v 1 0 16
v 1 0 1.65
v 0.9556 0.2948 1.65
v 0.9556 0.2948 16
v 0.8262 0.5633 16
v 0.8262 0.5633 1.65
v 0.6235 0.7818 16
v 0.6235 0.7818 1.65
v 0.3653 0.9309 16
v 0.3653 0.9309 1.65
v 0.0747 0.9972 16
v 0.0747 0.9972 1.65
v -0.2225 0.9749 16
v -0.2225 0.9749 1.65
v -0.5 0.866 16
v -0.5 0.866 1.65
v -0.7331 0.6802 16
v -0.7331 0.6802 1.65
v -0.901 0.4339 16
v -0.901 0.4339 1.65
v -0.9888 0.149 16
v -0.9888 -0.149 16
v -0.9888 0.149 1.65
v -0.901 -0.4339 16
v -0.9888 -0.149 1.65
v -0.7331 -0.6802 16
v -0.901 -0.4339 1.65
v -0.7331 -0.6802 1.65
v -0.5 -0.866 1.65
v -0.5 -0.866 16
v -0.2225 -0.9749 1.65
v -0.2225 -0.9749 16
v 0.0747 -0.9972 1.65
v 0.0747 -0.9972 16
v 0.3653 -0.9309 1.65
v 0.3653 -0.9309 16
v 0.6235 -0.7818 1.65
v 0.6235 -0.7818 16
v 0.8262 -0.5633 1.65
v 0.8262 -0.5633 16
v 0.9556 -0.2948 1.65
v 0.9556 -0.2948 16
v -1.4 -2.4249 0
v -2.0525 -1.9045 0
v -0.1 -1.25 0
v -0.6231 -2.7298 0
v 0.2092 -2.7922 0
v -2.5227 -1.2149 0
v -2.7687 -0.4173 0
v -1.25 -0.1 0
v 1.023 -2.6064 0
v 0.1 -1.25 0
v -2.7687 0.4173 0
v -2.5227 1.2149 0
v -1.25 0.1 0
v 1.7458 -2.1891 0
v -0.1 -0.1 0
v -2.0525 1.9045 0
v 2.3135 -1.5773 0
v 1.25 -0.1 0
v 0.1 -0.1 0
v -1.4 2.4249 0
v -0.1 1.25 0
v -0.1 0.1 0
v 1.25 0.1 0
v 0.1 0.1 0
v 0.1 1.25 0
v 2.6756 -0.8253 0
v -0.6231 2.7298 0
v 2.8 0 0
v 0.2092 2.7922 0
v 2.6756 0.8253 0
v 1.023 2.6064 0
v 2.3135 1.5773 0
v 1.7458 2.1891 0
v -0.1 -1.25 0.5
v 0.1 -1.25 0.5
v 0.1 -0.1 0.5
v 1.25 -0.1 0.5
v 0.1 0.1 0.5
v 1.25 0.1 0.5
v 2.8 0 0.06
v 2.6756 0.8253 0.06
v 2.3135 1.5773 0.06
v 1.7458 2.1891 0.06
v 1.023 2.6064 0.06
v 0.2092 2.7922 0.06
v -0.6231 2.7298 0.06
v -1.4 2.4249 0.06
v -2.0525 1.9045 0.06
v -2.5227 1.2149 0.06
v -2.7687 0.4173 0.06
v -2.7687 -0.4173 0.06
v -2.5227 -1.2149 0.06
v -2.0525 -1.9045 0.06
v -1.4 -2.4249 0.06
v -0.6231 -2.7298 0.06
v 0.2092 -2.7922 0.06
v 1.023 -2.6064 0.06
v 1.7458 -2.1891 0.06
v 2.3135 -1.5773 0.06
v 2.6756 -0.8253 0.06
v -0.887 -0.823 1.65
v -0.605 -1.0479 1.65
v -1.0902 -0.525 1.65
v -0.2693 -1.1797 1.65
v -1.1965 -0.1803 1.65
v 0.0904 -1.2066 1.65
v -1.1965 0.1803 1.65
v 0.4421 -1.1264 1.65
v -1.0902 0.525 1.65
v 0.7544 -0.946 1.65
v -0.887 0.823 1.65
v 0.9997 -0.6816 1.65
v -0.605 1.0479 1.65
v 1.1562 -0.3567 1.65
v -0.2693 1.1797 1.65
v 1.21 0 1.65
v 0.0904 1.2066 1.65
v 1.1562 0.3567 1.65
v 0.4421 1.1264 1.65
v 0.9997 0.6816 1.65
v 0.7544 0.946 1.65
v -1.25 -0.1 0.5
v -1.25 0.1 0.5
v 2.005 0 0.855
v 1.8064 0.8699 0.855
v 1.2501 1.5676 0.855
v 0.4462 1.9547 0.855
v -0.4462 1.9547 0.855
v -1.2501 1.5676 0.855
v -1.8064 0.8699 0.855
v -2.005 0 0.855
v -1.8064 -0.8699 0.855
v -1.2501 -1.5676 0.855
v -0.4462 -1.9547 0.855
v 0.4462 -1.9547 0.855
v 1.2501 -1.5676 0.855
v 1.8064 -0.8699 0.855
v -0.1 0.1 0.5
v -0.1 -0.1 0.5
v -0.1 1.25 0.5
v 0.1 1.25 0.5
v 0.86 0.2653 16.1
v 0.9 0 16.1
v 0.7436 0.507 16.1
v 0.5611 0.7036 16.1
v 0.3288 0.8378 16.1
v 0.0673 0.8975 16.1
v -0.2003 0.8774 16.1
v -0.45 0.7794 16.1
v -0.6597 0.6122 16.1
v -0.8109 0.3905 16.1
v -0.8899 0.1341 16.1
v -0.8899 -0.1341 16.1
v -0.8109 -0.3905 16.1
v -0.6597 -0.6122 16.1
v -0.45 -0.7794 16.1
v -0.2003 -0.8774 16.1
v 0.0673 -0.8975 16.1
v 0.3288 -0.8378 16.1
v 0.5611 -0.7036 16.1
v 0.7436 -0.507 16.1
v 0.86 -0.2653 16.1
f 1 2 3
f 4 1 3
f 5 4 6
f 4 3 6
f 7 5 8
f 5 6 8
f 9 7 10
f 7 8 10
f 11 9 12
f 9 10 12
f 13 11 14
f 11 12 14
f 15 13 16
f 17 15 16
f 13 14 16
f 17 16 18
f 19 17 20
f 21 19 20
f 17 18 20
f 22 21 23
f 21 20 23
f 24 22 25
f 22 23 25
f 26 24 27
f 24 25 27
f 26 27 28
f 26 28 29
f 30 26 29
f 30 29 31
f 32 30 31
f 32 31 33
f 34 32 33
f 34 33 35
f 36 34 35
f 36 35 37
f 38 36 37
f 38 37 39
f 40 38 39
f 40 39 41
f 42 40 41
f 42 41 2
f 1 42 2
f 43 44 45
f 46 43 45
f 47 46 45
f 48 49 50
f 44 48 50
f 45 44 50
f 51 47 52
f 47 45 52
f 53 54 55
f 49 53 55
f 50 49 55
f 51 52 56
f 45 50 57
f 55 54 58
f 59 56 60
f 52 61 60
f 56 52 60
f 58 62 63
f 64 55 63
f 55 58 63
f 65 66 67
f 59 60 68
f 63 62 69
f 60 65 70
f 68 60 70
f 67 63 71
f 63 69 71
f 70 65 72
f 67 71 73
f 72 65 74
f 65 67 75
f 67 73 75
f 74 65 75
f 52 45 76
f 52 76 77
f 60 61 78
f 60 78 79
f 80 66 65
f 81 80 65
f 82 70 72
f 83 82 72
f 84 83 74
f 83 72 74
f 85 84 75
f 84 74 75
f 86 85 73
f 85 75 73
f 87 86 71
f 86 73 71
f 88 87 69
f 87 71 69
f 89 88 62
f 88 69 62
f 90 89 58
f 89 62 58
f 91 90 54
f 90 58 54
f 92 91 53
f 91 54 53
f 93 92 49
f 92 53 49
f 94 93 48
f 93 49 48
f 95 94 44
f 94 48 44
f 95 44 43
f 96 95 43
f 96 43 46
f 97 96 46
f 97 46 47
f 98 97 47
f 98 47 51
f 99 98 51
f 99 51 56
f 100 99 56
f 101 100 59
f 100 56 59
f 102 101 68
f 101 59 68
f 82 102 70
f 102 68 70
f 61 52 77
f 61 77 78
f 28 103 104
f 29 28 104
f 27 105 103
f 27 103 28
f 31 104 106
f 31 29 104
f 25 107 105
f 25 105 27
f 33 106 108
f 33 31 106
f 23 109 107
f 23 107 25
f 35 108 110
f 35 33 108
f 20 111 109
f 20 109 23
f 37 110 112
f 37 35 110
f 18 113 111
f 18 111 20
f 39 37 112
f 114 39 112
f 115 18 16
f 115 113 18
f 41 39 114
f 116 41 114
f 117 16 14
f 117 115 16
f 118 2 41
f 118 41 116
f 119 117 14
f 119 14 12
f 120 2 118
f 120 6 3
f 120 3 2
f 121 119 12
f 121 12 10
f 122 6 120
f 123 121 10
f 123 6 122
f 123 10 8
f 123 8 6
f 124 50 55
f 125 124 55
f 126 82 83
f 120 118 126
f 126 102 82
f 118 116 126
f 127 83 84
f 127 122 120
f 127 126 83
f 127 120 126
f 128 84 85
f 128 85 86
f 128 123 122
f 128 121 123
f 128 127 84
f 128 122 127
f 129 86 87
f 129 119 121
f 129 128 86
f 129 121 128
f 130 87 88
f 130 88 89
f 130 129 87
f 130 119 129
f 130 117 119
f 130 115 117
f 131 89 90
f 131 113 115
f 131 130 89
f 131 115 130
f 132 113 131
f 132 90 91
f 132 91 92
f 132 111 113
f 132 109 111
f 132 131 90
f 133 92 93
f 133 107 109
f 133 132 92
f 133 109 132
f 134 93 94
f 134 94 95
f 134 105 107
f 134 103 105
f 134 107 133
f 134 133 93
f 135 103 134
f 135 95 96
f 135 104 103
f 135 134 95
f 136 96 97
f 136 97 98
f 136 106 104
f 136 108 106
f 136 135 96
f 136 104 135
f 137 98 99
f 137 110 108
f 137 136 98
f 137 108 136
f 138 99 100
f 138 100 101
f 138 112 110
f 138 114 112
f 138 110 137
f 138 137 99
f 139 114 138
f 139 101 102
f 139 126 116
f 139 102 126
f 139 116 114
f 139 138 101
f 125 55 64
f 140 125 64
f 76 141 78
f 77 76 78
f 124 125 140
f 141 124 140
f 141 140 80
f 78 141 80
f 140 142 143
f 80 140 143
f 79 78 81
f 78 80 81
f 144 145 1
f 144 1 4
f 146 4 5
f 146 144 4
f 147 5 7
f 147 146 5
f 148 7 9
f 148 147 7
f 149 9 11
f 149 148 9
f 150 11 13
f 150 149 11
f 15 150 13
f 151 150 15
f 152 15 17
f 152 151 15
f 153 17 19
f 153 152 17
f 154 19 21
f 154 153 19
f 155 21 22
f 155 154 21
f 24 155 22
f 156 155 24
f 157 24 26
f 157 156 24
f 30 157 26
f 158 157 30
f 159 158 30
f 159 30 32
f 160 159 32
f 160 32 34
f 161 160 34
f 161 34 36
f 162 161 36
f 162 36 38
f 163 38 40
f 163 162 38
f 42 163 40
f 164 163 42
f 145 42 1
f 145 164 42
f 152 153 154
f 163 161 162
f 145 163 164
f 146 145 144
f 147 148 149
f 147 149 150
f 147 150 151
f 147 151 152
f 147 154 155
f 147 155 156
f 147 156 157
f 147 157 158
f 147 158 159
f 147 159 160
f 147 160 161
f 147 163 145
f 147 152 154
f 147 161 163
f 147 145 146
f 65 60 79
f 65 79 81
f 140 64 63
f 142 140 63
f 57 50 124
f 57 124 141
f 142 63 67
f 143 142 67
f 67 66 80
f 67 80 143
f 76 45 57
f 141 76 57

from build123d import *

# Parameters (mm, degrees)
BOX_W             = 0.2
BOX_H             = 2.5
BOX_DEPTH         = 0.5
BOX001_W          = 2.5
BOX001_H          = 0.2
BOX001_DEPTH      = 0.5
CYLINDER_R        = 2.8
CYLINDER_DEPTH    = 1.65
CYLINDER001_R     = 1
CYLINDER001_DEPTH = 16
CHAMFER_SIZE      = 1.59
CHAMFER001_SIZE   = 0.1


with BuildPart() as w_rfel:
    # Box → Box (new body)
    with BuildSketch(Plane(origin=(-0.1, -1.25, 0), x_dir=(1, 0, 0), z_dir=(0, 0, 1))):
        with Locations((0.1, 1.25)):
            Rectangle(BOX_W, BOX_H)
    extrude(amount=BOX_DEPTH)


with BuildPart() as fusion:
    # Box001 → Box001 (new body)
    with BuildSketch(Plane(origin=(-1.25, -0.1, 0), x_dir=(1, 0, 0), z_dir=(0, 0, 1))):
        with Locations((1.25, 0.1)):
            Rectangle(BOX001_W, BOX001_H)
    extrude(amount=BOX001_DEPTH)

    # Fusion: union Würfel
    add(w_rfel.part)


with BuildPart() as zylinder:
    # Cylinder → Cylinder (new body)
    with BuildSketch(Plane.XY):
        Circle(CYLINDER_R)
    extrude(amount=CYLINDER_DEPTH)


with BuildPart() as screw:
    # Cylinder001 → Cylinder001 (new body)
    with BuildSketch(Plane.XY.offset(0.1)):
        Circle(CYLINDER001_R)
    extrude(amount=CYLINDER001_DEPTH)

    # Fusion001: union Zylinder
    add(zylinder.part)

    # Cut: cut Fusion
    add(fusion.part, mode=Mode.SUBTRACT)

    # Chamfer
    chamfer_edges = [screw.edges().sort_by_distance(p)[0] for p in [
        (-2.8, 0, 1.65),
    ]]
    chamfer(chamfer_edges, length=CHAMFER_SIZE)

    # Chamfer001
    chamfer001_edges = [screw.edges().sort_by_distance(p)[0] for p in [
        (-1, 0, 16.1),
    ]]
    chamfer(chamfer001_edges, length=CHAMFER001_SIZE)


solid = screw.part
